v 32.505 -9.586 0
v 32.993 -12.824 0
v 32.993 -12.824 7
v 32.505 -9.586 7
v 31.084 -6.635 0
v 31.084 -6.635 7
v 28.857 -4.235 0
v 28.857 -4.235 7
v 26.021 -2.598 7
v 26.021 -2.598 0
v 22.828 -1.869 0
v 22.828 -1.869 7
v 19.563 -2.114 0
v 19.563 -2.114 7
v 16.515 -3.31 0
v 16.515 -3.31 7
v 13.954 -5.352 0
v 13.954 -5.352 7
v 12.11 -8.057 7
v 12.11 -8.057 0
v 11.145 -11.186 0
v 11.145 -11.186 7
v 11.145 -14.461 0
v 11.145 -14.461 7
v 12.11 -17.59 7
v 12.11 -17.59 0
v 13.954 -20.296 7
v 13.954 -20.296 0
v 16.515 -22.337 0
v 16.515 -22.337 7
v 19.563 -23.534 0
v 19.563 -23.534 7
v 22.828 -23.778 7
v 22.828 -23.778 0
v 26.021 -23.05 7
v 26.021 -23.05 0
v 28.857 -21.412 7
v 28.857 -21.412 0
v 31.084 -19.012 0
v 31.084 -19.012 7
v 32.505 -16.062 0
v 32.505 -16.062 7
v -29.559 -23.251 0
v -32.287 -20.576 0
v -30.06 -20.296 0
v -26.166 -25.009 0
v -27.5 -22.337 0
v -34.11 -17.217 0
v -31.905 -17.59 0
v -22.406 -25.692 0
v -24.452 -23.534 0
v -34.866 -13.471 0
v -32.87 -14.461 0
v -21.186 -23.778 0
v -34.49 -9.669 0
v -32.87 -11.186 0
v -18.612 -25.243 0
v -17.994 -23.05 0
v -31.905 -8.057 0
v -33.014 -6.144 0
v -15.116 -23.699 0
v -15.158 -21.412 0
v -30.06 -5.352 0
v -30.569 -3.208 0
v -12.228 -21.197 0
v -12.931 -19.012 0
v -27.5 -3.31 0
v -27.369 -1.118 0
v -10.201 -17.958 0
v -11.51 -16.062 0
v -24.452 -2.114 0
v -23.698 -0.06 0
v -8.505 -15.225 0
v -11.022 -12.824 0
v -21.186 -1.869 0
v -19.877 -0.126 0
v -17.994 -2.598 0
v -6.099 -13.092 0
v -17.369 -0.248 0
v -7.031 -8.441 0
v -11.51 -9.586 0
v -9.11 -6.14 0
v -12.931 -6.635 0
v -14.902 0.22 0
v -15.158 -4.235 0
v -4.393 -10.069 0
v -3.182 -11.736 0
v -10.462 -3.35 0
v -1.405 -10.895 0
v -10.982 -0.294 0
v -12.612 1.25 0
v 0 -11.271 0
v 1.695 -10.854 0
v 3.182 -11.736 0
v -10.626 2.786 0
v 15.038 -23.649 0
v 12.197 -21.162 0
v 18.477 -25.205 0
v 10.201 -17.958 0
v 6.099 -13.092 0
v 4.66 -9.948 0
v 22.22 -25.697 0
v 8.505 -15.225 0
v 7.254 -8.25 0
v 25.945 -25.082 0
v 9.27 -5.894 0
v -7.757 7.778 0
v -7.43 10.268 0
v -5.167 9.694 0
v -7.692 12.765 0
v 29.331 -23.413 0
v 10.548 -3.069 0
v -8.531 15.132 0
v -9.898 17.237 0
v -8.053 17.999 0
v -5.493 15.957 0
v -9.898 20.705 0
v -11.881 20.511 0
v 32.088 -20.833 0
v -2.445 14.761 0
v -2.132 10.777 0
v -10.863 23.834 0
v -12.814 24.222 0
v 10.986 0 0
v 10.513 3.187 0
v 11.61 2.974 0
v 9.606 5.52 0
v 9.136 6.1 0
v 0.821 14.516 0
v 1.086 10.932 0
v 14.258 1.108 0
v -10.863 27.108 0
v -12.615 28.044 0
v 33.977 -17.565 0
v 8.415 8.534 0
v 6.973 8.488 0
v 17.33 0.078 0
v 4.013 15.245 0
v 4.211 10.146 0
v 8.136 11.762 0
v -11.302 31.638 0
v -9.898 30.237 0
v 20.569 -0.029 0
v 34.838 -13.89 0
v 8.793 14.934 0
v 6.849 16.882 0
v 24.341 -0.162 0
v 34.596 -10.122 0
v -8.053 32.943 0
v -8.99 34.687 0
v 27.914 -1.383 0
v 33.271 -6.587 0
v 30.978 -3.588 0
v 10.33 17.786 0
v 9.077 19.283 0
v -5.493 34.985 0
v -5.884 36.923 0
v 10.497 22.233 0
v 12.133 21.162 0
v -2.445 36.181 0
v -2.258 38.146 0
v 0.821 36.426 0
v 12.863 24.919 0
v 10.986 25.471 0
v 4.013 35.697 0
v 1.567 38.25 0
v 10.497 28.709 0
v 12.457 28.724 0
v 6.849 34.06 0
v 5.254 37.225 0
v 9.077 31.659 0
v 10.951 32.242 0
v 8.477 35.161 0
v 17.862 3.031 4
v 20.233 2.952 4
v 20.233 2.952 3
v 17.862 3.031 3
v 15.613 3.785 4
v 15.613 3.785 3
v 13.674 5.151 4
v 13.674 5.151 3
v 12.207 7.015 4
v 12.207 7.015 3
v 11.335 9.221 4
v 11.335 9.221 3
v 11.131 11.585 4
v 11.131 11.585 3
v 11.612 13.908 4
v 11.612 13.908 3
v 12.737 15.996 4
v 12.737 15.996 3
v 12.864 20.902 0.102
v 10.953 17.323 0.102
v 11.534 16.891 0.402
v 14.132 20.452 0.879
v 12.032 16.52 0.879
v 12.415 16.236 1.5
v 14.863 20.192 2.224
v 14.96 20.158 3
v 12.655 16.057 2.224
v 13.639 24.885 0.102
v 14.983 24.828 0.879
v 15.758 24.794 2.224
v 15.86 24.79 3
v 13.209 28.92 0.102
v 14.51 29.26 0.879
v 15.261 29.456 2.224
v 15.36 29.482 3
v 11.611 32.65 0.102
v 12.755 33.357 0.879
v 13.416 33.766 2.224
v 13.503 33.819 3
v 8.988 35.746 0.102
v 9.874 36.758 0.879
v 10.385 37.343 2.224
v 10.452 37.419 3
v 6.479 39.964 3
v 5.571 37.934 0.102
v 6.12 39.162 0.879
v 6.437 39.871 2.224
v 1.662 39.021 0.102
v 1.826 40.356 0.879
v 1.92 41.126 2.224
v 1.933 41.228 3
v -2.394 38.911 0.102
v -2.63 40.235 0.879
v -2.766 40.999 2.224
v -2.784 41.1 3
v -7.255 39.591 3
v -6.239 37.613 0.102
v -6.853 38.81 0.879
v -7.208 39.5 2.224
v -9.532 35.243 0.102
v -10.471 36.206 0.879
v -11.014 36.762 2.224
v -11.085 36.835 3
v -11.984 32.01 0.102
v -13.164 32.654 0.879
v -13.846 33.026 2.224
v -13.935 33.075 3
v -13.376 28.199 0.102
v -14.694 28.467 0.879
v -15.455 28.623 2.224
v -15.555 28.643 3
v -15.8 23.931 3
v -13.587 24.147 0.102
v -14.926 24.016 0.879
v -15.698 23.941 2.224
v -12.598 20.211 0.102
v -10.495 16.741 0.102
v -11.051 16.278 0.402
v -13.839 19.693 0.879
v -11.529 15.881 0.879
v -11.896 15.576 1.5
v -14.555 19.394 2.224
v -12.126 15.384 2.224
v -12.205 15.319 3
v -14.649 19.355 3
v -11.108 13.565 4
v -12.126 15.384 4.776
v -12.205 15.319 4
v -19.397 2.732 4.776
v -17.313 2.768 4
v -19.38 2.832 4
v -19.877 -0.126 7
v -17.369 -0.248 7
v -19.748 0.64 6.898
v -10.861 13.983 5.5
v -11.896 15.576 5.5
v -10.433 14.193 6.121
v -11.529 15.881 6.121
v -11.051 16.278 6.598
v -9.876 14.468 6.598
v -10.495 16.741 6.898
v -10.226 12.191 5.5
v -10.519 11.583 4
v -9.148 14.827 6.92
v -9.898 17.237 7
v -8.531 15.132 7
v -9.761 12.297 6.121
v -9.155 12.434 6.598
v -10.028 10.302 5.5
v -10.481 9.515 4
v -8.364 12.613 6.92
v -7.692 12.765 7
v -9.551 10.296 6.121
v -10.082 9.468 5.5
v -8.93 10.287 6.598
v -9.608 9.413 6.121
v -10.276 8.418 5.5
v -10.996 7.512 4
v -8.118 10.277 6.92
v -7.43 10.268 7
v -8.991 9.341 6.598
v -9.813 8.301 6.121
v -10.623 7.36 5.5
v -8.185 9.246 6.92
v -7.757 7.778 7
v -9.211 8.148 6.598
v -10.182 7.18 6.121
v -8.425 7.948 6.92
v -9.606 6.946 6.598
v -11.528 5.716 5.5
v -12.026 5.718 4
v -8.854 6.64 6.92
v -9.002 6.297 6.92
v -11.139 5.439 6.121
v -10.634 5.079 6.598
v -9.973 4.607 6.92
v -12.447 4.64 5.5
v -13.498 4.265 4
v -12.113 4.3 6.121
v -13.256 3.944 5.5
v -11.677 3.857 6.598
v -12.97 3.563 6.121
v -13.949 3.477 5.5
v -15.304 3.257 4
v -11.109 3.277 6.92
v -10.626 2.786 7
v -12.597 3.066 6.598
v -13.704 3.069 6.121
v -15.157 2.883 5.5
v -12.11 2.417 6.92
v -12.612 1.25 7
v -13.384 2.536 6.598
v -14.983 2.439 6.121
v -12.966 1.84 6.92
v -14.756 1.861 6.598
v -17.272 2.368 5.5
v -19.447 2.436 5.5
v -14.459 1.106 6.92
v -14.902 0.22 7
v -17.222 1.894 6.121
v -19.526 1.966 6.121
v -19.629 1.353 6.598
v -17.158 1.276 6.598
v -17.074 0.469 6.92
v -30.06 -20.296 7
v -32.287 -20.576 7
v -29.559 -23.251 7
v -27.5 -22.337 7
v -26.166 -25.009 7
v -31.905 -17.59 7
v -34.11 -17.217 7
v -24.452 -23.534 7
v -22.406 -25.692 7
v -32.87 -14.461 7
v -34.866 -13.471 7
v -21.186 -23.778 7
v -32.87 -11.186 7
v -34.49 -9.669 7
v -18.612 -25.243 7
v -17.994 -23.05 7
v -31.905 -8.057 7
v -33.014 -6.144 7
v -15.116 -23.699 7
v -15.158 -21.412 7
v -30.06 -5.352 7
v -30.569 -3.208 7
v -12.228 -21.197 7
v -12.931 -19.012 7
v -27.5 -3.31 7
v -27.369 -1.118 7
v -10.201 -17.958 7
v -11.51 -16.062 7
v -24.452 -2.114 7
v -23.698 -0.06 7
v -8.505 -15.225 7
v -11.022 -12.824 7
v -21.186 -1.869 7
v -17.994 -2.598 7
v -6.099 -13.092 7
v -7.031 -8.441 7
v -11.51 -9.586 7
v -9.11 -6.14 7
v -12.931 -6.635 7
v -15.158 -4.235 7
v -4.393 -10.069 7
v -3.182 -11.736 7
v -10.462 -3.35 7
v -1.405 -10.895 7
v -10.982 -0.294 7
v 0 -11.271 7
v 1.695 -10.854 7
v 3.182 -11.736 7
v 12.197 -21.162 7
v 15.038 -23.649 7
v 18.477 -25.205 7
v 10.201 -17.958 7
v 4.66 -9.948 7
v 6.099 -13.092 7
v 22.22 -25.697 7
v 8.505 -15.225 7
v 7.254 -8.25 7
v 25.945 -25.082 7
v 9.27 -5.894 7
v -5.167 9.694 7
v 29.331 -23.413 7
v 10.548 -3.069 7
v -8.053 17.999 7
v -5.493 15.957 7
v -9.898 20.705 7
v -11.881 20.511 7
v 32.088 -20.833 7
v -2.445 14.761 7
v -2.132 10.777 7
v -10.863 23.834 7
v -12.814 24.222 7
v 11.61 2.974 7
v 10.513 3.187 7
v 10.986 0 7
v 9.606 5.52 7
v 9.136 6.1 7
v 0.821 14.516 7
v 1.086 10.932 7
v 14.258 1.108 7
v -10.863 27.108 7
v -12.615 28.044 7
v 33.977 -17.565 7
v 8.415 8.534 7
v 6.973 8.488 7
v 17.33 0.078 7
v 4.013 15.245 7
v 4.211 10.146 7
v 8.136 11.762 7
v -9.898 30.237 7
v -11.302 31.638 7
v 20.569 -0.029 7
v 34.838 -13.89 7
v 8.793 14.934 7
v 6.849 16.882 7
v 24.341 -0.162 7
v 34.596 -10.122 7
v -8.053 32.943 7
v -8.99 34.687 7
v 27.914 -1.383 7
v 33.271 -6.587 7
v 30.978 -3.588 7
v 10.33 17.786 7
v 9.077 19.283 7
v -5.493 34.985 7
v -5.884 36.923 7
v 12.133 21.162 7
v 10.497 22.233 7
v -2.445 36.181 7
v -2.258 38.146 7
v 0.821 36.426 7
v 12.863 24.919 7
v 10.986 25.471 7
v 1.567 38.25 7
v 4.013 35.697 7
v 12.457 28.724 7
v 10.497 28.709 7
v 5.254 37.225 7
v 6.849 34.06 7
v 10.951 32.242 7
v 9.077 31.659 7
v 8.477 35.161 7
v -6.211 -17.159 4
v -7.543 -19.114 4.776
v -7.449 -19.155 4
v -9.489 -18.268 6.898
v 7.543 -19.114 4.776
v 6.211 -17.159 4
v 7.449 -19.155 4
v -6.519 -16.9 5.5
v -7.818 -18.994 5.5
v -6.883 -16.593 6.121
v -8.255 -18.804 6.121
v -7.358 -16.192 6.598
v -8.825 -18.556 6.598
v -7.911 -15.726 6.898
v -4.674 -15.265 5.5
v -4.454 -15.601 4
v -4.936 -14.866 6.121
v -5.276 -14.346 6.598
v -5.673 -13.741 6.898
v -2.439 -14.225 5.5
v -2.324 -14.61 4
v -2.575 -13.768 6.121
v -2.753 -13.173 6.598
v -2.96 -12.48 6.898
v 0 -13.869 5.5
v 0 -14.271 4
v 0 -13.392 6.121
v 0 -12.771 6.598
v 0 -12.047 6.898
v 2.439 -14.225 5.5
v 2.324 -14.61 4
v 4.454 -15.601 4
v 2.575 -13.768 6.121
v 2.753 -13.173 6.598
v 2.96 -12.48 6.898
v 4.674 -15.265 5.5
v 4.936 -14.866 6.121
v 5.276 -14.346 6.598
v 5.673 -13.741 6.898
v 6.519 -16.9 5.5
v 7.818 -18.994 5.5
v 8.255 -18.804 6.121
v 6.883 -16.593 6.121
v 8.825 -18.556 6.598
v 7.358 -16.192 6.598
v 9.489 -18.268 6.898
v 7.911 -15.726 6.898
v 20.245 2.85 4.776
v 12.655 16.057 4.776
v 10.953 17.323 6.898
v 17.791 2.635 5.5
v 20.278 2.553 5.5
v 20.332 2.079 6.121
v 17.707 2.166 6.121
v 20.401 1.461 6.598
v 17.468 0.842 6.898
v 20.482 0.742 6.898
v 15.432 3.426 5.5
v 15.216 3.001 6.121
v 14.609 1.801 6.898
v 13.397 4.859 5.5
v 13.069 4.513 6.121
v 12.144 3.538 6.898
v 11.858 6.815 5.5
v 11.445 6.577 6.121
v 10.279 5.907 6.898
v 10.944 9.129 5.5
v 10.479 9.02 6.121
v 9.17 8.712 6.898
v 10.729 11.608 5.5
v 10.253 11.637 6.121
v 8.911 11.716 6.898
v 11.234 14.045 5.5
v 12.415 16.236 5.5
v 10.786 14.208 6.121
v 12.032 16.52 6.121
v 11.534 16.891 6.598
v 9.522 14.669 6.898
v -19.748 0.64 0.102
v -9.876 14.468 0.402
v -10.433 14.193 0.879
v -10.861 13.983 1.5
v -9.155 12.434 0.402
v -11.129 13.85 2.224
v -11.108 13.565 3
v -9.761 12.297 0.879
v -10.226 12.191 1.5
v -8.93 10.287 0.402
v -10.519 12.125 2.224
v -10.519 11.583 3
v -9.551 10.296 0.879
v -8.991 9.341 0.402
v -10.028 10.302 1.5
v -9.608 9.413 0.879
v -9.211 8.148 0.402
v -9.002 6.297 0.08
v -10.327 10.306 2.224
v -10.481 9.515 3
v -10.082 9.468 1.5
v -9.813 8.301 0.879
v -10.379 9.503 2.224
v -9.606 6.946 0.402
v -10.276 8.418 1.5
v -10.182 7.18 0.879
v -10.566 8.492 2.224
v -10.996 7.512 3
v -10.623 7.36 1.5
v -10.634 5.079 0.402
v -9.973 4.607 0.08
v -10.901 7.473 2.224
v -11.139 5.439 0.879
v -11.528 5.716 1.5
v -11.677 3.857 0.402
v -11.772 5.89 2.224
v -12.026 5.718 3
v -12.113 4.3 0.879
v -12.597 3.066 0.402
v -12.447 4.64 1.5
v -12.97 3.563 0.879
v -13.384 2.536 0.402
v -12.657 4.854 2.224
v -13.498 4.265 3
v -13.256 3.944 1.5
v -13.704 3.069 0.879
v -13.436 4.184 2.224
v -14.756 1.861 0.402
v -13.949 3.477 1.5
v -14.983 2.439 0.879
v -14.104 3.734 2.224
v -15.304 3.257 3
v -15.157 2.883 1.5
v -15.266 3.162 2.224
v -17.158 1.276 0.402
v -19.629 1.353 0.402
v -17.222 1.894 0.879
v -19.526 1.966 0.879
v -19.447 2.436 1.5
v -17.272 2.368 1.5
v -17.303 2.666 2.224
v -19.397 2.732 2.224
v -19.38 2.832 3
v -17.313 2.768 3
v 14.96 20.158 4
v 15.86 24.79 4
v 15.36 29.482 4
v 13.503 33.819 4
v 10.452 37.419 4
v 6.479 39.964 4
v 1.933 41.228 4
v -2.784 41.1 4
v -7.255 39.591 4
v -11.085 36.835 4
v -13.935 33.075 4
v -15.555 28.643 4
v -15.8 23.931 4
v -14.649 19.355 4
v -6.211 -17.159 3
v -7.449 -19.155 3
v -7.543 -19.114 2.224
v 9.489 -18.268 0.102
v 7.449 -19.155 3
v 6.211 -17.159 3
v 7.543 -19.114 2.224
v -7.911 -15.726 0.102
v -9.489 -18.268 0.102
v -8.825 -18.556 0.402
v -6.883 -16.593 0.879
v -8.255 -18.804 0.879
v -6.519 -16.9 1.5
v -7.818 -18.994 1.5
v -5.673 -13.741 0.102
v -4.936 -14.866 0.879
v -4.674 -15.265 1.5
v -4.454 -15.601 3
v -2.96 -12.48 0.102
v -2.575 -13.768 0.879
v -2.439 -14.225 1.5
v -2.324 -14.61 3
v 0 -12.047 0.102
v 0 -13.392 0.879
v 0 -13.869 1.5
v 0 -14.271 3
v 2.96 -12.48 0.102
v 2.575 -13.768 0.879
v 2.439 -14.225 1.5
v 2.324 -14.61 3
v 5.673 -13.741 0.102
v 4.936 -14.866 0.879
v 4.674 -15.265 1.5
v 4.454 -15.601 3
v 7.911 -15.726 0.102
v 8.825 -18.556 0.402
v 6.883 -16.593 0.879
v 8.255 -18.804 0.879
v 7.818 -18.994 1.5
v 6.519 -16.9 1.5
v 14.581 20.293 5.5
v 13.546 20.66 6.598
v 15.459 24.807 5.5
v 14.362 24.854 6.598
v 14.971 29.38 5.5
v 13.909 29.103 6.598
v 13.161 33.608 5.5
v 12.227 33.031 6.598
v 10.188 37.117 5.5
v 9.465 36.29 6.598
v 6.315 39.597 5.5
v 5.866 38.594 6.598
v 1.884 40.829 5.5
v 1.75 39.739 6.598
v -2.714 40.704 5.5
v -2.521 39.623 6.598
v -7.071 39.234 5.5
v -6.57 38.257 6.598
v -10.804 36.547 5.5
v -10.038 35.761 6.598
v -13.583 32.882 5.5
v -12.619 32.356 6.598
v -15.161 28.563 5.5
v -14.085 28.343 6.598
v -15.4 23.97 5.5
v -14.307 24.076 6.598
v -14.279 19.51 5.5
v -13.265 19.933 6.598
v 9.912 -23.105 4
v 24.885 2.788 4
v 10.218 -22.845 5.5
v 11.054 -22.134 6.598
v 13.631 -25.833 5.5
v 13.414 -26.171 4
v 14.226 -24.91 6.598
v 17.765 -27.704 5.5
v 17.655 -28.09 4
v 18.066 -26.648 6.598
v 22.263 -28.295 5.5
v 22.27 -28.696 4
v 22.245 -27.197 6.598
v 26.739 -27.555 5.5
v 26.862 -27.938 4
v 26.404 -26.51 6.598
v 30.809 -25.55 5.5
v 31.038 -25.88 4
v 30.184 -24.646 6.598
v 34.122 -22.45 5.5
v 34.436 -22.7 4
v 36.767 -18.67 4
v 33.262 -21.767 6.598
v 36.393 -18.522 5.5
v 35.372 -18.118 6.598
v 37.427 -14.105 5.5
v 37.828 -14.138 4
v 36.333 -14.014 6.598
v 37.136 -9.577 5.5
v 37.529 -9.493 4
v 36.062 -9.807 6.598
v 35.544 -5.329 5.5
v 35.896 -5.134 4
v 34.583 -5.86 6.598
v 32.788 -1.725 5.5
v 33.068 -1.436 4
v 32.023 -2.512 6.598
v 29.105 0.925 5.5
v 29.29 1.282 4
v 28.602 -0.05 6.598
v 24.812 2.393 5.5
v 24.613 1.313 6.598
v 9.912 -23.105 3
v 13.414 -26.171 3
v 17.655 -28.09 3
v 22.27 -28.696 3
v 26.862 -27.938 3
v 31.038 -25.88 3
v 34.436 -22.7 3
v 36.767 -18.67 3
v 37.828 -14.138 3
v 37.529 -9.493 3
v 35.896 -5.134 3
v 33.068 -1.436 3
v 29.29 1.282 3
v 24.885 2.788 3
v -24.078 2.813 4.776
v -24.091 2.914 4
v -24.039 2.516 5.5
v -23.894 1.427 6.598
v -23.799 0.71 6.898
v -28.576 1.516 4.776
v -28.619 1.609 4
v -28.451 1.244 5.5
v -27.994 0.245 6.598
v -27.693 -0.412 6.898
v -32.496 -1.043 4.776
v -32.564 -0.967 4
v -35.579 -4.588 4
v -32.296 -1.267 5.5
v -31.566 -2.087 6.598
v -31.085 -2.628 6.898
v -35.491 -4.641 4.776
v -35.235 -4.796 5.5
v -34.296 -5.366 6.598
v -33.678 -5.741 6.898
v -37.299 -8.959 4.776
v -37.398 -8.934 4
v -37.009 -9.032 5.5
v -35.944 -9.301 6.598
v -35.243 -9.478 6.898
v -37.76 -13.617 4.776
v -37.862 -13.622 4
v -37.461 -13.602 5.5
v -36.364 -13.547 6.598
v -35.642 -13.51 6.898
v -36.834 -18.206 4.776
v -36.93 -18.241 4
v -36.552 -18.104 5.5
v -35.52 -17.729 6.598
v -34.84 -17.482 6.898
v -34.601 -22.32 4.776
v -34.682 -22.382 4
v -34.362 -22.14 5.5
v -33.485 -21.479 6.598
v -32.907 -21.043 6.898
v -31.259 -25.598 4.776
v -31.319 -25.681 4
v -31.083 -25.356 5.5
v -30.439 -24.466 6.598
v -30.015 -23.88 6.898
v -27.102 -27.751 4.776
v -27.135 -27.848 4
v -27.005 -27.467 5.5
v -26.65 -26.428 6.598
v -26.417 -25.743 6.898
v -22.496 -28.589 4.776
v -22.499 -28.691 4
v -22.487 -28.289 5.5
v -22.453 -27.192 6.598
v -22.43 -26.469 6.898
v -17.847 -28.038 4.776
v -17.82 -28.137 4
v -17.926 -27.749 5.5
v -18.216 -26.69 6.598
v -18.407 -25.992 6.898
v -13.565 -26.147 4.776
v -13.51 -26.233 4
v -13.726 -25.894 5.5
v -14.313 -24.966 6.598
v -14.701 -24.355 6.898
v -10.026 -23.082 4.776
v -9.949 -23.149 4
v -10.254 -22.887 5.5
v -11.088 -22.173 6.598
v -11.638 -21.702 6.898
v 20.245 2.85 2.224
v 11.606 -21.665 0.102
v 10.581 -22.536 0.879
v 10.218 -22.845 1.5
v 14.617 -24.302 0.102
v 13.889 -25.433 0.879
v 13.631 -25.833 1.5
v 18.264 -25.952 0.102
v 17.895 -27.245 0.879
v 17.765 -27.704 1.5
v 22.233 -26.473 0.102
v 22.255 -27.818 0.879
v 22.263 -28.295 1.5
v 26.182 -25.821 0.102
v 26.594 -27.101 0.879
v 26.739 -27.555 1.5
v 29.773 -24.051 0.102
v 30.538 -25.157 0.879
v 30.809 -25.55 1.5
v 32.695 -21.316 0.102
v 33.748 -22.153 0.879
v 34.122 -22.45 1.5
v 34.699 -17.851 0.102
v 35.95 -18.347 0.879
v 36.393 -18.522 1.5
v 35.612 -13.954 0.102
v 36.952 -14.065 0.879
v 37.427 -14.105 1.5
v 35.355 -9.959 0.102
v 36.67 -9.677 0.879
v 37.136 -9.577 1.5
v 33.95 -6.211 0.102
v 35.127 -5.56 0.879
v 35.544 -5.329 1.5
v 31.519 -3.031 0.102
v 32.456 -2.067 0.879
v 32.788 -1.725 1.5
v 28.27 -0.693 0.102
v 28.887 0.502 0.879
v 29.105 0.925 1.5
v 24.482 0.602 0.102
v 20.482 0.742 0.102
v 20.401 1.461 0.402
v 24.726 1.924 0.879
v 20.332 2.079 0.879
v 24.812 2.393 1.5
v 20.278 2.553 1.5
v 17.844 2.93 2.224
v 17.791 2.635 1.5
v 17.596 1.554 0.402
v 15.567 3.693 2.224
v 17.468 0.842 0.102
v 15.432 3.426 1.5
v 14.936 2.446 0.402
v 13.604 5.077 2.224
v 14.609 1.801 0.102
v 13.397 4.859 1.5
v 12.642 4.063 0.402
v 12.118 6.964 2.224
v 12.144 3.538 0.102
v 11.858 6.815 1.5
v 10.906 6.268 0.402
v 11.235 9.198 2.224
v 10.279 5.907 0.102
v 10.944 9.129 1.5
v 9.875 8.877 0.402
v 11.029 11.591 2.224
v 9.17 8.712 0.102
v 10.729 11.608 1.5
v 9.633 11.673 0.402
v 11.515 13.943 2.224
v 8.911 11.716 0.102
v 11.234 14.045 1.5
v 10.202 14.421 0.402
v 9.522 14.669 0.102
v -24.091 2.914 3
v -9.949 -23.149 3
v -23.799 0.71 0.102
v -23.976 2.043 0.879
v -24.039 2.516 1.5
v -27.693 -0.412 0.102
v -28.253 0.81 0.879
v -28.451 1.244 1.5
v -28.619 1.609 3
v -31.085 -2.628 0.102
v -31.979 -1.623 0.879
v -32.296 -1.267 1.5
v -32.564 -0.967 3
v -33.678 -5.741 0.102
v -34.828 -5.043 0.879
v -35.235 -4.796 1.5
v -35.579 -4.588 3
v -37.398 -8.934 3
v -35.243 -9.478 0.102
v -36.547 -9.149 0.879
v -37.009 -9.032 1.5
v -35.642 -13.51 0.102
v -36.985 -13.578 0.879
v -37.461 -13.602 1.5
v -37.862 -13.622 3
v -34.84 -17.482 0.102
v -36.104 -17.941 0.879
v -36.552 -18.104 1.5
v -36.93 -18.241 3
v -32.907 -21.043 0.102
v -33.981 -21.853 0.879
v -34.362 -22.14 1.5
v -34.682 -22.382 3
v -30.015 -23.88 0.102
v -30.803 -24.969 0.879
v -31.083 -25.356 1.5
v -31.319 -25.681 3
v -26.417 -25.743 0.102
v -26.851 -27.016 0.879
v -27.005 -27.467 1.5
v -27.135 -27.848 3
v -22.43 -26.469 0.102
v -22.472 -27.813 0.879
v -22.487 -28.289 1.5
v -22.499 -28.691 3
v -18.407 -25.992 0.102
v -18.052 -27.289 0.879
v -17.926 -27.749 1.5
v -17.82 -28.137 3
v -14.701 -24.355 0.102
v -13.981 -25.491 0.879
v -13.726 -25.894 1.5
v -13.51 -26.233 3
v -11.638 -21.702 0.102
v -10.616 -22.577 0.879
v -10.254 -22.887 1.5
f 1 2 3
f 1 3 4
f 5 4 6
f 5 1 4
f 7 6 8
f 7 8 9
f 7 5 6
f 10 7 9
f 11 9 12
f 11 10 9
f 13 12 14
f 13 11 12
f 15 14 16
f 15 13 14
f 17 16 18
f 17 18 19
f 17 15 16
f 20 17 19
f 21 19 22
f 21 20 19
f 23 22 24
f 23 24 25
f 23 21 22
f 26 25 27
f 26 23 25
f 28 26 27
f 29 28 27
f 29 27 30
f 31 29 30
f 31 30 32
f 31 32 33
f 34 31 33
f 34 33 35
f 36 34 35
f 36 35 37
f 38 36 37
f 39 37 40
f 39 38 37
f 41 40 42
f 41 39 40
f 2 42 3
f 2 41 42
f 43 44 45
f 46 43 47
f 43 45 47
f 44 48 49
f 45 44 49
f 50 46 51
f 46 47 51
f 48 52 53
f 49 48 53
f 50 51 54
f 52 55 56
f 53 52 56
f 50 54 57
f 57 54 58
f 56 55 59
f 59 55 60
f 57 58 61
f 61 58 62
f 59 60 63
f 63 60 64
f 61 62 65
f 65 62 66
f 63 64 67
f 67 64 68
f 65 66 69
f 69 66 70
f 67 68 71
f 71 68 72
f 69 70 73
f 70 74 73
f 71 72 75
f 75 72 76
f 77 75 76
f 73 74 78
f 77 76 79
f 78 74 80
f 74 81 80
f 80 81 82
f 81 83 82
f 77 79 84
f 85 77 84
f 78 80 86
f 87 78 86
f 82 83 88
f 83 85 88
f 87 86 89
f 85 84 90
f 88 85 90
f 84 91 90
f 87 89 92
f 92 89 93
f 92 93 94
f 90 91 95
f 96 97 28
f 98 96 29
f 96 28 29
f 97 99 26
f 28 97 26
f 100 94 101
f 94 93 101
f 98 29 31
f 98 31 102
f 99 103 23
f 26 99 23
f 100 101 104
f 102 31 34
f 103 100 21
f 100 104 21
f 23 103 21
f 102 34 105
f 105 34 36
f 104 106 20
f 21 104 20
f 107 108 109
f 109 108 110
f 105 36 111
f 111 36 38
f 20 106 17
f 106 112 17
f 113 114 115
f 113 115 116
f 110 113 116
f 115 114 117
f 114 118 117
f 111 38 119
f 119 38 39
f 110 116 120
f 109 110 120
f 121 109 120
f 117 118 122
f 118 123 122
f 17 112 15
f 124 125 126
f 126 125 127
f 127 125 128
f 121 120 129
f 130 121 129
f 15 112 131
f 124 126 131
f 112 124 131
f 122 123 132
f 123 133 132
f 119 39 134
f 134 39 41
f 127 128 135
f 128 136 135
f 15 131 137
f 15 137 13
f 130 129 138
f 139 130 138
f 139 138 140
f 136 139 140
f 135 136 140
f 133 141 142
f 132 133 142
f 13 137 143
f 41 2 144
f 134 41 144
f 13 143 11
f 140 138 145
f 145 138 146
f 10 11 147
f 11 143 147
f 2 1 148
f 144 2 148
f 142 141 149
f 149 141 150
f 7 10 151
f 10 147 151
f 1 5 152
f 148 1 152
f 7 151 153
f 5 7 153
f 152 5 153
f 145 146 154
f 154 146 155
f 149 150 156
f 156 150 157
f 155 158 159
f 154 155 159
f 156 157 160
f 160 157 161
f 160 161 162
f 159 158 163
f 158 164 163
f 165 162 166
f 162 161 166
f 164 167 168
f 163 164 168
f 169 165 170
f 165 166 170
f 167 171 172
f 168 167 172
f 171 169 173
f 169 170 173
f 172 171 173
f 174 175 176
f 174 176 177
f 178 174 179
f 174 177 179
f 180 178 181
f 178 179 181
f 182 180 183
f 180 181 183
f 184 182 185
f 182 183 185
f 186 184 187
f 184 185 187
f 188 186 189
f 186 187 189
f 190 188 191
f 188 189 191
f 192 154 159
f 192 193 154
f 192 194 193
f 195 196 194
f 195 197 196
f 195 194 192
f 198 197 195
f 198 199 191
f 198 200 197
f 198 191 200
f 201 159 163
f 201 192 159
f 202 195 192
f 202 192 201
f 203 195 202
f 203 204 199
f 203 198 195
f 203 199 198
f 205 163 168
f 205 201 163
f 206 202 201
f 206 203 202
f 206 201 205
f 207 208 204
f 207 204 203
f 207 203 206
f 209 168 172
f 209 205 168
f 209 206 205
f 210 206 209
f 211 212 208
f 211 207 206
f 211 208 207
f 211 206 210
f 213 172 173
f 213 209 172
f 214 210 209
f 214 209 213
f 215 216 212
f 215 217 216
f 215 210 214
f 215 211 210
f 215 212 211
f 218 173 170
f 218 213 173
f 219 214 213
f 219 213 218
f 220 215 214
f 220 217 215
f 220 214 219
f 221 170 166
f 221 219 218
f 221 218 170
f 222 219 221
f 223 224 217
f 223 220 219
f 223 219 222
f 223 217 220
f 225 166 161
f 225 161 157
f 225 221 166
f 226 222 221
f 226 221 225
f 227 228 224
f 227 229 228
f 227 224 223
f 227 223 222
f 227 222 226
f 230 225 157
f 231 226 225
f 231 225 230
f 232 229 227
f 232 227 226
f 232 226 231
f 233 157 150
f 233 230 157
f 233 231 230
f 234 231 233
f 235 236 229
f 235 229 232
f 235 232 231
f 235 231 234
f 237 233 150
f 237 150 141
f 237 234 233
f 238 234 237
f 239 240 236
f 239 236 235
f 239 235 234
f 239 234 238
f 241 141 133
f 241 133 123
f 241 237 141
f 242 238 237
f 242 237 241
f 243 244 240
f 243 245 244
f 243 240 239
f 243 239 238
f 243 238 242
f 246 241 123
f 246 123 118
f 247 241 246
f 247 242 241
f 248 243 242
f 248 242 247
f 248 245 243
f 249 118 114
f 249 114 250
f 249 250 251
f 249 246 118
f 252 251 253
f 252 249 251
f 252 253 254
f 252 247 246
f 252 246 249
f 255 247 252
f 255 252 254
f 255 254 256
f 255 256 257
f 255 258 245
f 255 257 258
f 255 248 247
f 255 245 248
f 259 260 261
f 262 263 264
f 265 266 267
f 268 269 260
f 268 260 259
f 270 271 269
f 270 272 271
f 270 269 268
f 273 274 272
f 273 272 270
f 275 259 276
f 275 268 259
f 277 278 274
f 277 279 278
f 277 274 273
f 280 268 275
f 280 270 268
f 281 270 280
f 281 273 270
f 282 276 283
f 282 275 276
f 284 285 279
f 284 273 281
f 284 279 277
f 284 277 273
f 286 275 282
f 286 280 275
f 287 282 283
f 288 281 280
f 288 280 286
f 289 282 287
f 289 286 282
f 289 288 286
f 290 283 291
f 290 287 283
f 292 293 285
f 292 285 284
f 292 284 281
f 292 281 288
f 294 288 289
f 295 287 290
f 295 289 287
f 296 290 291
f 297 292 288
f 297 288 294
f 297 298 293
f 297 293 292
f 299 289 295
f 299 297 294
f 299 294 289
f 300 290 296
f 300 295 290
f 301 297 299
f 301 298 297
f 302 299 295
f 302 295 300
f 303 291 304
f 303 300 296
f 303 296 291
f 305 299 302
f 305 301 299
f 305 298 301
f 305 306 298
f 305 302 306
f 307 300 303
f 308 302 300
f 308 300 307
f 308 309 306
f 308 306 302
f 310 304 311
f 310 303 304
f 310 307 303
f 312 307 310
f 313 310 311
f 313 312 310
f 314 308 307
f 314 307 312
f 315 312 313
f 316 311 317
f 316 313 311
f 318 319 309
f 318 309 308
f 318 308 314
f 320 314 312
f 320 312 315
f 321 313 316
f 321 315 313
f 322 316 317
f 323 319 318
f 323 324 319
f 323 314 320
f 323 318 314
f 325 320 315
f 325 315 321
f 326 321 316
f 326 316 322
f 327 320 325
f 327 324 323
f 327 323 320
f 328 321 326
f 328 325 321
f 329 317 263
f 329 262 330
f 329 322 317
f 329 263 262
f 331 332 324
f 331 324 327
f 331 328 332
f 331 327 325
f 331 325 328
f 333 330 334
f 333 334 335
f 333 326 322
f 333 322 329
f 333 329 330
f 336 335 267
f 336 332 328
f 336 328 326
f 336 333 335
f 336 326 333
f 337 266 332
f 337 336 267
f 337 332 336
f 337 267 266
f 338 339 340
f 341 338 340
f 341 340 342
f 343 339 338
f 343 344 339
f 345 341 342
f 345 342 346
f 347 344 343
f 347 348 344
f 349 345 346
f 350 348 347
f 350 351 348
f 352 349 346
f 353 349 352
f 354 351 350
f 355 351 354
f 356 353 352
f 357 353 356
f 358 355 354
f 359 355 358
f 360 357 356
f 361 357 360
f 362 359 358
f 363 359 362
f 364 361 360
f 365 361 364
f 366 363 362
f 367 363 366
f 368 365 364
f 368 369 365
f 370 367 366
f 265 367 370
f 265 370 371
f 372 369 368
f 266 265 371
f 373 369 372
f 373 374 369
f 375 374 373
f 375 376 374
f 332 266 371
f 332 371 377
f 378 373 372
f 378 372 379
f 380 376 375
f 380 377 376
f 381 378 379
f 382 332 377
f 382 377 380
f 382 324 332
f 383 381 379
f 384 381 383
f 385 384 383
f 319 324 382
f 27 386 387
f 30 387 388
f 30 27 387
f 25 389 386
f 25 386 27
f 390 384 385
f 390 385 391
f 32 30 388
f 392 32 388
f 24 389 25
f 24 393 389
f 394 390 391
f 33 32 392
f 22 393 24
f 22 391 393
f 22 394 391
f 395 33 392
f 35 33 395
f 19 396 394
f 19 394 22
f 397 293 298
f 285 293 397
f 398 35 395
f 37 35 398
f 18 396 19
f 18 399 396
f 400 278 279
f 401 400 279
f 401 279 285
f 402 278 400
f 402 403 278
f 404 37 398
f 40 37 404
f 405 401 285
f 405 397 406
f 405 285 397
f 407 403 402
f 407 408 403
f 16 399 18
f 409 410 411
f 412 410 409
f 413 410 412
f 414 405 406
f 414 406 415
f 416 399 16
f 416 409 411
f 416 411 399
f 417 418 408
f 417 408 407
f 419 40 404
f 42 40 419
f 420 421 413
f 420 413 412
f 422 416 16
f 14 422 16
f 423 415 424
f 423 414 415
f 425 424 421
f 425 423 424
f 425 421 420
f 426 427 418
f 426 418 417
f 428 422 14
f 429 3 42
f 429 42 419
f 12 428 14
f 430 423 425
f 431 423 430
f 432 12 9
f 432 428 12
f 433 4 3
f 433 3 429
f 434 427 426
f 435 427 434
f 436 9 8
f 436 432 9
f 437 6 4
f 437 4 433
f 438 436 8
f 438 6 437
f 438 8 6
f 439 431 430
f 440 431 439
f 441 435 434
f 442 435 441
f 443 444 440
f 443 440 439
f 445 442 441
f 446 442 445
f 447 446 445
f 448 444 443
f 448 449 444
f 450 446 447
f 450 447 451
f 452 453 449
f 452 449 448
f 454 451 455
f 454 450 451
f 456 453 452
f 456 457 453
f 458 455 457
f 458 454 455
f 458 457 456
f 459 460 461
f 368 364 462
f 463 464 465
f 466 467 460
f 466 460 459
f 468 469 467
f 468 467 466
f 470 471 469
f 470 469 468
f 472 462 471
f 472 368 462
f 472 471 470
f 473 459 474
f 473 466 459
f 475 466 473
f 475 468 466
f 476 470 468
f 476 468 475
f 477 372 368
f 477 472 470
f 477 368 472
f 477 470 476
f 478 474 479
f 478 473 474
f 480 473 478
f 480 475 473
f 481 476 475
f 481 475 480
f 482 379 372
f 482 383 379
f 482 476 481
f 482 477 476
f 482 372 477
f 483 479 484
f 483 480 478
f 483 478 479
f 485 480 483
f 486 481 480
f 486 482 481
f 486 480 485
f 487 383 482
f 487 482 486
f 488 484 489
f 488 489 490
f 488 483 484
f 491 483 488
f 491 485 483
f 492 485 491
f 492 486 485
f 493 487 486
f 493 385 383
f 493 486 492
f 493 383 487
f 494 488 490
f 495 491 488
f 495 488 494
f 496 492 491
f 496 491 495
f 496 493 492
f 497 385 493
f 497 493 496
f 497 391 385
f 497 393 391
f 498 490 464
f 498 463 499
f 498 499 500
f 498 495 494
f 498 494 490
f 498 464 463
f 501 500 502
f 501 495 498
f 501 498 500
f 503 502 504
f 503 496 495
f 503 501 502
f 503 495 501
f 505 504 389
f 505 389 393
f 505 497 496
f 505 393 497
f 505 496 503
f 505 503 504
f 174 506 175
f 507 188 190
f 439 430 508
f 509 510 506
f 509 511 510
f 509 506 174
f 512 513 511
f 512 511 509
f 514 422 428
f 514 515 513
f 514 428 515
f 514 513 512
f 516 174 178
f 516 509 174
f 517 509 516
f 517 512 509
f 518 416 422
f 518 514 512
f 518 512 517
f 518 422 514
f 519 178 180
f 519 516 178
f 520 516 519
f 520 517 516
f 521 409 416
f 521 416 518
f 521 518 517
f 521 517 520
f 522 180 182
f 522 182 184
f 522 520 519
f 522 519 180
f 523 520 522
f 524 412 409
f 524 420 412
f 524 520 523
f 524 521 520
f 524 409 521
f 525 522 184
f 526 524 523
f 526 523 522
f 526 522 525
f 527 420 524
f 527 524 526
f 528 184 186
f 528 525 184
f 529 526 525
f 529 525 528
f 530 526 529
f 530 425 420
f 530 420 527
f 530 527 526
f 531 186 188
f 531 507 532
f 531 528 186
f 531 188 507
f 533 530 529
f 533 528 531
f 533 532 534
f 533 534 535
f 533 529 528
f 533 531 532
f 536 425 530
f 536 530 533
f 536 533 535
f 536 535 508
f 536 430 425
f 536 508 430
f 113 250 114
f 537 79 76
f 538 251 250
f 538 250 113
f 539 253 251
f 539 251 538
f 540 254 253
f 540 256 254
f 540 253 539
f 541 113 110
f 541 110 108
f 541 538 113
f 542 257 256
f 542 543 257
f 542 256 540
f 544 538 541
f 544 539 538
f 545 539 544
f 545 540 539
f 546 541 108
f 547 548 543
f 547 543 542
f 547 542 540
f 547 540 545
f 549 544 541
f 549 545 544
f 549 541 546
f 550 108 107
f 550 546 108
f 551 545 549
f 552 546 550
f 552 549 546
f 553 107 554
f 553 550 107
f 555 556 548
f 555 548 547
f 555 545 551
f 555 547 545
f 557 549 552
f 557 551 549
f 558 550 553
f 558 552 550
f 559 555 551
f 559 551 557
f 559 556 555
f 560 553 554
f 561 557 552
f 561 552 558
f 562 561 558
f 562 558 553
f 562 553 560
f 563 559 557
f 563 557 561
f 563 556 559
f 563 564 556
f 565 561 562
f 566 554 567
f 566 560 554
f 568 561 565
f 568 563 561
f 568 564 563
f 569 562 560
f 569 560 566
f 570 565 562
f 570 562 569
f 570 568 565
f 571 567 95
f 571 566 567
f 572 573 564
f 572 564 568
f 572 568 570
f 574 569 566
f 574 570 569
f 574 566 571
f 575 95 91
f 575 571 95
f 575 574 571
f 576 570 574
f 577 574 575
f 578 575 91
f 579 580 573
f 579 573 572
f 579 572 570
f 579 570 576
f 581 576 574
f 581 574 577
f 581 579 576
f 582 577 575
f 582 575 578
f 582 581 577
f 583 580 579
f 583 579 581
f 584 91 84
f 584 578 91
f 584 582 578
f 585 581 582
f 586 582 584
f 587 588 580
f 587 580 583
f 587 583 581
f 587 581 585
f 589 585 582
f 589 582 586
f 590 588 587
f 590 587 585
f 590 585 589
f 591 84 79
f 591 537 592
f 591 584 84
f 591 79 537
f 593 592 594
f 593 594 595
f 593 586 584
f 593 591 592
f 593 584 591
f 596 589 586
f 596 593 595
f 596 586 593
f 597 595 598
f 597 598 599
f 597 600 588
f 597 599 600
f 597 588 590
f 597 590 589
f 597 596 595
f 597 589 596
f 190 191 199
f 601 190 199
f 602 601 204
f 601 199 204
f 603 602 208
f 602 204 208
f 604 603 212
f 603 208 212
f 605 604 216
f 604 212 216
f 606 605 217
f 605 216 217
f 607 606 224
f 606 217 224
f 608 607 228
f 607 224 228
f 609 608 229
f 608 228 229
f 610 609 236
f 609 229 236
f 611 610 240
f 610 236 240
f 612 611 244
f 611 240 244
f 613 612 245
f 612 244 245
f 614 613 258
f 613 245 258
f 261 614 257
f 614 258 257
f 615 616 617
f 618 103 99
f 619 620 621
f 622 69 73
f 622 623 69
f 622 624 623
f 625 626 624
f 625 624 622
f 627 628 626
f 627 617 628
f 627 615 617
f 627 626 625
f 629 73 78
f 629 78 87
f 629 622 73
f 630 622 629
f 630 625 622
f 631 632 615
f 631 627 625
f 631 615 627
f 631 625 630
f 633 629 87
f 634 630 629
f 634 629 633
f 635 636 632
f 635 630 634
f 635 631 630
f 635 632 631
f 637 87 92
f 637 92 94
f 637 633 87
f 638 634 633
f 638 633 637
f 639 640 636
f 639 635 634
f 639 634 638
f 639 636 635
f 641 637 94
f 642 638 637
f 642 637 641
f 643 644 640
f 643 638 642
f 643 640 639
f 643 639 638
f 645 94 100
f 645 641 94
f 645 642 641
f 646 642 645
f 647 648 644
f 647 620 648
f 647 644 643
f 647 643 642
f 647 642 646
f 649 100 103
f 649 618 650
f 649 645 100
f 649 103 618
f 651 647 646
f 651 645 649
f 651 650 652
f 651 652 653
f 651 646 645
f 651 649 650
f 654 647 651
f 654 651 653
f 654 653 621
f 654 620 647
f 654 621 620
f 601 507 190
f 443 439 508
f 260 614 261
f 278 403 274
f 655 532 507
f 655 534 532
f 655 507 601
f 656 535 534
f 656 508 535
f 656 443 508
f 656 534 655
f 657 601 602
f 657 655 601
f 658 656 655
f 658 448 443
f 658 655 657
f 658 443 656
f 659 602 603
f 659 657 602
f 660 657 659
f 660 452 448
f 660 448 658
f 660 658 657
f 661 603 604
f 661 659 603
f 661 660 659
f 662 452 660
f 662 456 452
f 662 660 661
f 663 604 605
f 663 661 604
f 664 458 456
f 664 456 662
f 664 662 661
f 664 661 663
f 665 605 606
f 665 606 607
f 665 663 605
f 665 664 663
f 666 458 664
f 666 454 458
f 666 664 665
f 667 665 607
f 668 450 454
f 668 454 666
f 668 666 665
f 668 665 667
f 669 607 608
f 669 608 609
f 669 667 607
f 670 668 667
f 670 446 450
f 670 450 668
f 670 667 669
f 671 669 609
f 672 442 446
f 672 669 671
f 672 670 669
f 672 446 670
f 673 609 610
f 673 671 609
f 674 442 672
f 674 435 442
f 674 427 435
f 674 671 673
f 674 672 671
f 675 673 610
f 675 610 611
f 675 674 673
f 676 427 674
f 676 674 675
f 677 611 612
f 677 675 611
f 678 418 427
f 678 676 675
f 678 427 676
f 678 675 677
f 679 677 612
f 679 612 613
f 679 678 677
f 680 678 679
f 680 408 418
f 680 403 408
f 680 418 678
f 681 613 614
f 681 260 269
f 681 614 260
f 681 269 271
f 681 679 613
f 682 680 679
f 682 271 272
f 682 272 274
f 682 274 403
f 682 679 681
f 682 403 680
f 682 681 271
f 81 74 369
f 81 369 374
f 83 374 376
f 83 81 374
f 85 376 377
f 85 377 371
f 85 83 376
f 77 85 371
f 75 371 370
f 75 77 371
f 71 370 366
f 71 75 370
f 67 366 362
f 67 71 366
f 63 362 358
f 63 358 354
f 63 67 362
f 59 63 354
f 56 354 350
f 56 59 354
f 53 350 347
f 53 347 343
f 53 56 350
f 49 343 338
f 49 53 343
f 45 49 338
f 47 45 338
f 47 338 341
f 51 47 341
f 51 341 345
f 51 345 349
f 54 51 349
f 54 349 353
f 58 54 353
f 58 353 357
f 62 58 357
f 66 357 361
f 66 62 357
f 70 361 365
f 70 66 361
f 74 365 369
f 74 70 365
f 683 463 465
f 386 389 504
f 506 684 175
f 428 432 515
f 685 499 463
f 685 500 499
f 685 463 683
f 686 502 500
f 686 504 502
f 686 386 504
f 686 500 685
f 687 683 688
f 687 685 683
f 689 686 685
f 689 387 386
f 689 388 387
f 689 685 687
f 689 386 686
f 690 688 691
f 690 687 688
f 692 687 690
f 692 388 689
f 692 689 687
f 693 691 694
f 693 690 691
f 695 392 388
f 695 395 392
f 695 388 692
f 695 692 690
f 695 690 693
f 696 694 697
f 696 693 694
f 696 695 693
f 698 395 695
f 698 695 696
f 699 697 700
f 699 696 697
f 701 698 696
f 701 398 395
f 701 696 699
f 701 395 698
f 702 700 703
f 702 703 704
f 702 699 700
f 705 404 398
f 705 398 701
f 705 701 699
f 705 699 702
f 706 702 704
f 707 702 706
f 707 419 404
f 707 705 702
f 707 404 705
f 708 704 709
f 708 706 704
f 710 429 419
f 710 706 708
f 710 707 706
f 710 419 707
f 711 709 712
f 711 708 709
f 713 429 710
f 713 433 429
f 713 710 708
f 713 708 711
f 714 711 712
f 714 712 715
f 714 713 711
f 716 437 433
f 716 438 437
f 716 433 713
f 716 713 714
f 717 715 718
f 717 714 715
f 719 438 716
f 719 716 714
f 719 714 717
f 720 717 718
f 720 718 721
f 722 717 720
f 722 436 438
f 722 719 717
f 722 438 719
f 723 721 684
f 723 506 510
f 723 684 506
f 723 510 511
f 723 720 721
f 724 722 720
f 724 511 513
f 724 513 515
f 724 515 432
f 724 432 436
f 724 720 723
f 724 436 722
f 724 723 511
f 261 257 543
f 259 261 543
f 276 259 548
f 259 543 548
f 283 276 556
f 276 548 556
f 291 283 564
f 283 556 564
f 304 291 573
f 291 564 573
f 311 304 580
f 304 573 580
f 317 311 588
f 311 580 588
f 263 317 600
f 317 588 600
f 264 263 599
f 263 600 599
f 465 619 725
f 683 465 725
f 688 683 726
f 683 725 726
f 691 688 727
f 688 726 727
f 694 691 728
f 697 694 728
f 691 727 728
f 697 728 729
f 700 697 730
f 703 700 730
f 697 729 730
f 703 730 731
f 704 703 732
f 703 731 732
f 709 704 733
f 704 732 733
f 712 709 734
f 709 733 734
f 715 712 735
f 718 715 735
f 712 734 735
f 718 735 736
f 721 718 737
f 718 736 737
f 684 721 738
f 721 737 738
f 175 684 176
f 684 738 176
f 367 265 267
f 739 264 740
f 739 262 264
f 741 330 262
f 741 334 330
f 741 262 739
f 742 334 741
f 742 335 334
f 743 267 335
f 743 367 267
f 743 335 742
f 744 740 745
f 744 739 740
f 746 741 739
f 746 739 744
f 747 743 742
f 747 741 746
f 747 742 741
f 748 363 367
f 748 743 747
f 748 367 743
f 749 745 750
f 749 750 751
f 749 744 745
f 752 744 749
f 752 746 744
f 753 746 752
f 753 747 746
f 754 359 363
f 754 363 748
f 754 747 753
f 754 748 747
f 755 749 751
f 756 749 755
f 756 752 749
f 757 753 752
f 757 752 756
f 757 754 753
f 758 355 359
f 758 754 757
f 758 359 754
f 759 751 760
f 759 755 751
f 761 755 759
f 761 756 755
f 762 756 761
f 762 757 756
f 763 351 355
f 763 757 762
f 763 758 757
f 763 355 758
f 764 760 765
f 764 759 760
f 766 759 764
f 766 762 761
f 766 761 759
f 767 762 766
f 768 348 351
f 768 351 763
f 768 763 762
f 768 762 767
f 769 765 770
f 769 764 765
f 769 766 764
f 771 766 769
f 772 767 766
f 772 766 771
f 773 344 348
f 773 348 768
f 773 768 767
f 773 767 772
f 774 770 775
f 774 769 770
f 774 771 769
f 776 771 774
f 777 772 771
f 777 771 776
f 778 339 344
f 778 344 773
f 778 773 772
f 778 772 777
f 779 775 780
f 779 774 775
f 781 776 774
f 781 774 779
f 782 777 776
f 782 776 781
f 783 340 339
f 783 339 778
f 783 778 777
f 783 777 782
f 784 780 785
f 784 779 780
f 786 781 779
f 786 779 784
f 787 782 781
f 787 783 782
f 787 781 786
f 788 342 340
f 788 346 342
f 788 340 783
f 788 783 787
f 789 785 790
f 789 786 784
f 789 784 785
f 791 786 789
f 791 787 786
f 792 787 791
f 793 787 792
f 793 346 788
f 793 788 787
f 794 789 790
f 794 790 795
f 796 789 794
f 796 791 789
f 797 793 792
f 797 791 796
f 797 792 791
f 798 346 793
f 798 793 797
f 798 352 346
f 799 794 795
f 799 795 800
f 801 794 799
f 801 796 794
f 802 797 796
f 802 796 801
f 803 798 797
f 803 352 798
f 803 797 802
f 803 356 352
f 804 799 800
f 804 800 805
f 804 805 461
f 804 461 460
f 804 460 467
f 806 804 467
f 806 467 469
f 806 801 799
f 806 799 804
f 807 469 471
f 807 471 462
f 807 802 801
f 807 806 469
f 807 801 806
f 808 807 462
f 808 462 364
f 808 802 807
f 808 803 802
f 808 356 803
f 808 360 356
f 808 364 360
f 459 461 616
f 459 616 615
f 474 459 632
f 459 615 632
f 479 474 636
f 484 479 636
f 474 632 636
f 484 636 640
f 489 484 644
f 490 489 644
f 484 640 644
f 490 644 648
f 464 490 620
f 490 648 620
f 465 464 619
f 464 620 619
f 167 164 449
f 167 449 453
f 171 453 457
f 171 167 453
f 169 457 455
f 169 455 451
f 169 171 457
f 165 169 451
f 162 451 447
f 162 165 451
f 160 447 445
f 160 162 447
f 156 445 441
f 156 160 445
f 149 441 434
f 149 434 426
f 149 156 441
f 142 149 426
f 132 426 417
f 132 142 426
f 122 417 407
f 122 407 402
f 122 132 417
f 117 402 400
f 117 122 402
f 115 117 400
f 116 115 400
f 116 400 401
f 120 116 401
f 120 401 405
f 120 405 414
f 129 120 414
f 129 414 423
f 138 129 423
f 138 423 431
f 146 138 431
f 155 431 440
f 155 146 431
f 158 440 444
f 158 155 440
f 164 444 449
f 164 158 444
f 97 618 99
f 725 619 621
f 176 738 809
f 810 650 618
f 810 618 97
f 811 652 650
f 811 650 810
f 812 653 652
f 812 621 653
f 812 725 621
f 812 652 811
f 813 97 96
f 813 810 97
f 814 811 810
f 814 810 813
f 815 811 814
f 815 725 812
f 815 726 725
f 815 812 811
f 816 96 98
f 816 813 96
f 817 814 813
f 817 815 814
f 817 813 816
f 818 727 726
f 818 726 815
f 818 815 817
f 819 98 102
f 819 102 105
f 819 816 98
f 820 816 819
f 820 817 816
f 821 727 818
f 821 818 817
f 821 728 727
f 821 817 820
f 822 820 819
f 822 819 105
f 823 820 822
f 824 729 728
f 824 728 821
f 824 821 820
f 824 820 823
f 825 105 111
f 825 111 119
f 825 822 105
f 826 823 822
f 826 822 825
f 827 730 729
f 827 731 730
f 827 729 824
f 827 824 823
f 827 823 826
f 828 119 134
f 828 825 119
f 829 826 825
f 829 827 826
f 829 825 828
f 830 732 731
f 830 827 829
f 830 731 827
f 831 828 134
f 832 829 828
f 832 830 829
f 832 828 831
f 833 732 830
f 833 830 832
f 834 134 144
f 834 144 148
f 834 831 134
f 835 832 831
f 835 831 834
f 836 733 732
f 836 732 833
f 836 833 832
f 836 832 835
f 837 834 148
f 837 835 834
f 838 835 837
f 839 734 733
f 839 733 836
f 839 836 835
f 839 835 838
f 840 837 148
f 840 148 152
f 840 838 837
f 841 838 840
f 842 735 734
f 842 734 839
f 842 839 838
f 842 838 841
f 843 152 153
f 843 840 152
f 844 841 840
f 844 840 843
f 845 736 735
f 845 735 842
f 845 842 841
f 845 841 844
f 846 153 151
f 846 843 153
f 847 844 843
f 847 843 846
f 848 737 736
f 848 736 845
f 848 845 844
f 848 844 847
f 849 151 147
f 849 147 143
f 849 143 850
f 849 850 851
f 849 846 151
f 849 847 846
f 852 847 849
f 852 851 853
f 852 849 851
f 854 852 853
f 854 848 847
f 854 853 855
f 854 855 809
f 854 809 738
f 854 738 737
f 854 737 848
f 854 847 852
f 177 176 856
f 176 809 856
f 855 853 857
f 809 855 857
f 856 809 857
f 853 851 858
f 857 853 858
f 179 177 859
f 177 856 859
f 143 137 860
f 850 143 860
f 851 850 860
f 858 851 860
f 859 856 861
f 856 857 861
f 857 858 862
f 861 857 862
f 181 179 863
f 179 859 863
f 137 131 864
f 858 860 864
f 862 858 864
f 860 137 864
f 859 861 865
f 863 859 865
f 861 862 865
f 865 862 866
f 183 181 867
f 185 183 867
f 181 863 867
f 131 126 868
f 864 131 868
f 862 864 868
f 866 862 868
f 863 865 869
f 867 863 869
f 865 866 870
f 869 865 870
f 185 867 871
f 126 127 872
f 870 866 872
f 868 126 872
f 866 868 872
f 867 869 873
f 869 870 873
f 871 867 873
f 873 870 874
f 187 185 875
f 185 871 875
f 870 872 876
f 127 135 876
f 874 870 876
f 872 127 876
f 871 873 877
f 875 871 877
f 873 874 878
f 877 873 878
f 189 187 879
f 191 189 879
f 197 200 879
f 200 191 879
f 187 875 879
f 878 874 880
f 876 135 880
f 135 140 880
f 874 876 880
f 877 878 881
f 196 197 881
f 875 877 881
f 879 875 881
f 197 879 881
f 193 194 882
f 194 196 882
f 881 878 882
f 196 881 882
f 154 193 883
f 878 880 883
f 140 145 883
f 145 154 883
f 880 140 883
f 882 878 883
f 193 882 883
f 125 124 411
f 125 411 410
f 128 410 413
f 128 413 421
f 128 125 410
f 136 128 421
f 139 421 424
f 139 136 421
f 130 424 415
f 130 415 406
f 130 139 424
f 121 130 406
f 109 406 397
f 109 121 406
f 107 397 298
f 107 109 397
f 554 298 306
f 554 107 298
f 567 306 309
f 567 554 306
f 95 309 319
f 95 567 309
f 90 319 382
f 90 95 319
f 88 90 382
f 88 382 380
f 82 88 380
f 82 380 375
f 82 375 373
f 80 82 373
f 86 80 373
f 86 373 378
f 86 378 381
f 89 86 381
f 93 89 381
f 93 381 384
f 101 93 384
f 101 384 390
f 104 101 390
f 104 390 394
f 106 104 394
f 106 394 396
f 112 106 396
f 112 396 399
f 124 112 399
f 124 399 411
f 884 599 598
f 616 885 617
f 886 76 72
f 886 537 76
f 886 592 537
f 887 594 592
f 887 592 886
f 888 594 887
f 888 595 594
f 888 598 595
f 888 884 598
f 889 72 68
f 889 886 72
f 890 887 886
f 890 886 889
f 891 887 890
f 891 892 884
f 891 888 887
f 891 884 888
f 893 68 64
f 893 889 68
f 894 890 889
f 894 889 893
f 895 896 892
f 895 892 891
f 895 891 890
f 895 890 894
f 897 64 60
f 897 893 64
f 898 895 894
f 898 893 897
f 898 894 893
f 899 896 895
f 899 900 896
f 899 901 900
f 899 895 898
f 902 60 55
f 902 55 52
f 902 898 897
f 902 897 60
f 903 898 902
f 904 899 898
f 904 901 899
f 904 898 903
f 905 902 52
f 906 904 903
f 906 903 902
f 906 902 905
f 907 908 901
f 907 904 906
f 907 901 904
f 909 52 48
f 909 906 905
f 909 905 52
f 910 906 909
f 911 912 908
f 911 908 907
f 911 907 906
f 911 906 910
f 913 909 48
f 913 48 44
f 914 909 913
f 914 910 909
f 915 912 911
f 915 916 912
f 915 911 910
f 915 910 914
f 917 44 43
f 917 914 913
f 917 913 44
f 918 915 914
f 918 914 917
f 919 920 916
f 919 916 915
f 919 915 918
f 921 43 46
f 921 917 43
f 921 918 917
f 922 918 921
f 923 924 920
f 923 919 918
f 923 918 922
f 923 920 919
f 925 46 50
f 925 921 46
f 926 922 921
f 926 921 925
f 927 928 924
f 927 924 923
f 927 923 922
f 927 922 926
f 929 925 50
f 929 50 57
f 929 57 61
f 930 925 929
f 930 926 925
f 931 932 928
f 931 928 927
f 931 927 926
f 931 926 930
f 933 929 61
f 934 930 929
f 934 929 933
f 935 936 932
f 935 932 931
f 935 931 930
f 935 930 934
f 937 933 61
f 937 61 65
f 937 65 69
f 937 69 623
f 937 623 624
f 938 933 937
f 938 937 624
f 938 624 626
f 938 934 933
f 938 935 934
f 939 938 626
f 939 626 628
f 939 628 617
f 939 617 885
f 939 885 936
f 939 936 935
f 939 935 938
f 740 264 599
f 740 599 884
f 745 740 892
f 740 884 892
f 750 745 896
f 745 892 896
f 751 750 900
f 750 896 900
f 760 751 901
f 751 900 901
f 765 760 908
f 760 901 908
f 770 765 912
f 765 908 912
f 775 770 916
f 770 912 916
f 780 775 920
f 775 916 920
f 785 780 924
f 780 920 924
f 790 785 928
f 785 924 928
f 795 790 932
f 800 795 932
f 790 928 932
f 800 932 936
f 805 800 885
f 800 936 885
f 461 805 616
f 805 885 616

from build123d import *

# Parameters (mm, degrees)
F0_R         = 10.9855
F1_DEPTH     = 7
F2_T3_ANGLE  = 256.3995561368
F2_T6_ANGLE  = 256.0217037288
F2_T9_ANGLE  = 252.9127531636
F2_T12_ANGLE = 132.9933300565
F2_T15_ANGLE = 133.0613909212
F2_T18_ANGLE = 139.2792920515
F3_T2_ANGLE  = 256.3995561368
F3_T4_ANGLE  = 252.9127531636
F3_T6_ANGLE  = 256.0217037288
F3_T8_ANGLE  = 133.0613909212
F3_T10_ANGLE = 139.2792920515
F3_T12_ANGLE = 132.9933300565


# Not quite as in the source:
# - a fillet or chamfer that OpenCascade refuses, or shapes differently, is made with other operations: its cross-section is extruded or revolved along the edge and cut away or added
# - a feature names something its author has since deleted; it is built from what else it names


with BuildPart() as f1:
    # F0 (on Top) → F1 (new body)
    with BuildSketch(Plane.XY):
        with BuildLine():
            ThreePointArc((20.233408665, 2.951924091), (12.2068374294, 7.0151023416), (12.7372395679, 15.9958560332))
            ThreePointArc((12.7372395679, 15.9958560332), (-0.4306472142, 41.3401577589), (-12.2046104843, 15.3189998066))
            ThreePointArc((-12.2046104843, 15.3189998066), (-11.4501444105, 6.5802412239), (-19.3804348229, 2.8324932871))
            ThreePointArc((-19.3804348229, 2.8324932871), (-35.9605045031, -20.3950847915), (-7.4494474677, -19.1546329687))
            ThreePointArc((-7.4494474677, -19.1546329687), (0, -14.2708711815), (7.4494474677, -19.1546329687))
            ThreePointArc((7.4494474677, -19.1546329687), (35.7499761764, -20.7708093962), (20.233408665, 2.951924091))
        make_face()
        with Locations((-22.0074076702, -12.8236441247)):
            Circle(F0_R, mode=Mode.SUBTRACT)
        with Locations((22.0074076702, -12.8236441247)):
            Circle(F0_R, mode=Mode.SUBTRACT)
        Circle(F0_R, mode=Mode.SUBTRACT)
        with Locations((0, 25.471)):
            Circle(F0_R, mode=Mode.SUBTRACT)
    extrude(amount=F1_DEPTH)

    # F2: fillet of radius 3 on 3 edges, made by hand


with BuildPart() as f2_tool1:
    # F2_s2 → F2_t3 (revolve)
    with BuildSketch(Plane(origin=(12.1977481645, 16.3971799378, 0), x_dir=(0, 0, 1), z_dir=(-0.5968594625, -0.8023457996, 0))):
        with BuildLine():
            ThreePointArc((4, -0.6723926313), (6.1213203436, 0.2062870251), (7, 2.3276073687))
            Line((7, 2.3276073687), (7, -0.6723926313))
            Line((7, -0.6723926313), (4, -0.6723926313))
        make_face()
    revolve(axis=Axis((0, 25.471, 7), (0, 0, 1)), revolution_arc=F2_T3_ANGLE)


with BuildPart() as f2_tool4:
    # F2_s5 → F2_t6 (revolve)
    with BuildSketch(Plane(origin=(-19.3119921223, 3.2403956096, 0), x_dir=(0, 0, 1), z_dir=(0.9862133803, -0.1654786046, 0))):
        with BuildLine():
            ThreePointArc((4, 0.4136045308), (6.1213203436, 1.2922841872), (7, 3.4136045308))
            Line((7, 3.4136045308), (7, 0.4136045308))
            Line((7, 0.4136045308), (4, 0.4136045308))
        make_face()
    revolve(axis=Axis((-22.0074076702, -12.8236441247, 7), (0, 0, 1)), revolution_arc=F2_T6_ANGLE)


with BuildPart() as f2_tool7:
    # F2_s8 → F2_t9 (revolve)
    with BuildSketch(Plane(origin=(8.189951579, -18.8326013653, 0), x_dir=(0, 0, 1), z_dir=(-0.3988024469, 0.9170368631, 0))):
        with BuildLine():
            ThreePointArc((4, -0.8074965588), (6.1213203436, 0.0711830977), (7, 2.1925034412))
            Line((7, 2.1925034412), (7, -0.8074965588))
            Line((7, -0.8074965588), (4, -0.8074965588))
        make_face()
    revolve(axis=Axis((22.0074076702, -12.8236441247, 7), (0, 0, 1)), revolution_arc=F2_T9_ANGLE)


with BuildPart() as f2_tool10:
    # F2_s11 → F2_t12 (revolve)
    with BuildSketch(Plane(origin=(-8.189951579, -18.8326013653, 0), x_dir=(0, 0, 1), z_dir=(-0.3988024469, -0.9170368631, 0))):
        with BuildLine():
            ThreePointArc((4, -0.8074965588), (6.1213203436, 0.0711830977), (7, 2.1925034412))
            Line((7, 2.1925034412), (7, -0.8074965588))
            Line((7, -0.8074965588), (4, -0.8074965588))
        make_face()
    revolve(axis=Axis((0, -22.3942605097, 7), (0, 0, -1)), revolution_arc=F2_T12_ANGLE)


with BuildPart() as f2_tool13:
    # F2_s14 → F2_t15 (revolve)
    with BuildSketch(Plane(origin=(20.3085471758, 2.2837429368, 0), x_dir=(0, 0, 1), z_dir=(0.9937365805, 0.1117479688, 0))):
        with BuildLine():
            ThreePointArc((4, -0.6723926313), (6.1213203436, 0.2062870251), (7, 2.3276073687))
            Line((7, 2.3276073687), (7, -0.6723926313))
            Line((7, -0.6723926313), (4, -0.6723926313))
        make_face()
    revolve(axis=Axis((19.3170019466, 11.1012165414, 7), (0, 0, -1)), revolution_arc=F2_T15_ANGLE)


with BuildPart() as f2_tool16:
    # F2_s17 → F2_t18 (revolve)
    with BuildSketch(Plane(origin=(-12.5225873153, 15.0545013325, 0), x_dir=(0, 0, 1), z_dir=(-0.6394960752, 0.7687943612, 0))):
        with BuildLine():
            ThreePointArc((4, 0.4136045308), (6.1213203436, 1.2922841872), (7, 3.4136045308))
            Line((7, 3.4136045308), (7, 0.4136045308))
            Line((7, 0.4136045308), (4, 0.4136045308))
        make_face()
    revolve(axis=Axis((-18.1094514577, 10.4072538085, 7), (0, 0, -1)), revolution_arc=F2_T18_ANGLE)


with BuildPart() as f1_1:
    add(f1.part)

    # F2_t19: cut F2_tool1, F2_tool4, F2_tool7, F2_tool10, F2_tool13, F2_tool16
    add([f2_tool1.part, f2_tool4.part, f2_tool7.part, f2_tool10.part, f2_tool13.part, f2_tool16.part], mode=Mode.SUBTRACT)

    # F3: fillet of radius 3 on 6 edges, made by hand

    # F3_s1 → F3_t2 (revolve, cut)
    with BuildSketch(Plane(origin=(12.1977481645, 16.3971799378, 0), x_dir=(0, 0, 1), z_dir=(-0.5968594625, -0.8023457996, 0))):
        with BuildLine():
            ThreePointArc((0, 2.3276073687), (0.8786796564, 0.2062870251), (3, -0.6723926313))
            Line((3, -0.6723926313), (0, -0.6723926313))
            Line((0, -0.6723926313), (0, 2.3276073687))
        make_face()
    revolve(axis=Axis((0, 25.471, 0), (0, 0, 1)), revolution_arc=F3_T2_ANGLE, mode=Mode.SUBTRACT)

    # F3_s3 → F3_t4 (revolve, cut)
    with BuildSketch(Plane(origin=(8.189951579, -18.8326013653, 0), x_dir=(0, 0, 1), z_dir=(-0.3988024469, 0.9170368631, 0))):
        with BuildLine():
            ThreePointArc((0, 2.1925034412), (0.8786796564, 0.0711830977), (3, -0.8074965588))
            Line((3, -0.8074965588), (0, -0.8074965588))
            Line((0, -0.8074965588), (0, 2.1925034412))
        make_face()
    revolve(axis=Axis((22.0074076702, -12.8236441247, 0), (0, 0, 1)), revolution_arc=F3_T4_ANGLE, mode=Mode.SUBTRACT)

    # F3_s5 → F3_t6 (revolve, cut)
    with BuildSketch(Plane(origin=(-19.3119921223, 3.2403956096, 0), x_dir=(0, 0, 1), z_dir=(0.9862133803, -0.1654786046, 0))):
        with BuildLine():
            ThreePointArc((0, 3.4136045308), (0.8786796564, 1.2922841872), (3, 0.4136045308))
            Line((3, 0.4136045308), (0, 0.4136045308))
            Line((0, 0.4136045308), (0, 3.4136045308))
        make_face()
    revolve(axis=Axis((-22.0074076702, -12.8236441247, 0), (0, 0, 1)), revolution_arc=F3_T6_ANGLE, mode=Mode.SUBTRACT)

    # F3_s7 → F3_t8 (revolve, cut)
    with BuildSketch(Plane(origin=(20.3085471758, 2.2837429368, 0), x_dir=(0, 0, 1), z_dir=(0.9937365805, 0.1117479688, 0))):
        with BuildLine():
            ThreePointArc((3, -0.6723926313), (0.8786796564, 0.2062870251), (0, 2.3276073687))
            Line((0, 2.3276073687), (0, -0.6723926313))
            Line((0, -0.6723926313), (3, -0.6723926313))
        make_face()
    revolve(axis=Axis((19.3170019466, 11.1012165414, 0), (0, 0, -1)), revolution_arc=F3_T8_ANGLE, mode=Mode.SUBTRACT)

    # F3_s9 → F3_t10 (revolve, cut)
    with BuildSketch(Plane(origin=(-12.5225873153, 15.0545013325, 0), x_dir=(0, 0, 1), z_dir=(-0.6394960752, 0.7687943612, 0))):
        with BuildLine():
            ThreePointArc((0, 3.4136045308), (0.8786796564, 1.2922841872), (3, 0.4136045308))
            Line((3, 0.4136045308), (0, 0.4136045308))
            Line((0, 0.4136045308), (0, 3.4136045308))
        make_face()
    revolve(axis=Axis((-18.1094514577, 10.4072538085, 0), (0, 0, -1)), revolution_arc=F3_T10_ANGLE, mode=Mode.SUBTRACT)

    # F3_s11 → F3_t12 (revolve, cut)
    with BuildSketch(Plane(origin=(-8.189951579, -18.8326013653, 0), x_dir=(0, 0, 1), z_dir=(-0.3988024469, -0.9170368631, 0))):
        with BuildLine():
            ThreePointArc((0, 2.1925034412), (0.8786796564, 0.0711830977), (3, -0.8074965588))
            Line((3, -0.8074965588), (0, -0.8074965588))
            Line((0, -0.8074965588), (0, 2.1925034412))
        make_face()
    revolve(axis=Axis((0, -22.3942605097, 0), (0, 0, -1)), revolution_arc=F3_T12_ANGLE, mode=Mode.SUBTRACT)


solid = f1_1.part
